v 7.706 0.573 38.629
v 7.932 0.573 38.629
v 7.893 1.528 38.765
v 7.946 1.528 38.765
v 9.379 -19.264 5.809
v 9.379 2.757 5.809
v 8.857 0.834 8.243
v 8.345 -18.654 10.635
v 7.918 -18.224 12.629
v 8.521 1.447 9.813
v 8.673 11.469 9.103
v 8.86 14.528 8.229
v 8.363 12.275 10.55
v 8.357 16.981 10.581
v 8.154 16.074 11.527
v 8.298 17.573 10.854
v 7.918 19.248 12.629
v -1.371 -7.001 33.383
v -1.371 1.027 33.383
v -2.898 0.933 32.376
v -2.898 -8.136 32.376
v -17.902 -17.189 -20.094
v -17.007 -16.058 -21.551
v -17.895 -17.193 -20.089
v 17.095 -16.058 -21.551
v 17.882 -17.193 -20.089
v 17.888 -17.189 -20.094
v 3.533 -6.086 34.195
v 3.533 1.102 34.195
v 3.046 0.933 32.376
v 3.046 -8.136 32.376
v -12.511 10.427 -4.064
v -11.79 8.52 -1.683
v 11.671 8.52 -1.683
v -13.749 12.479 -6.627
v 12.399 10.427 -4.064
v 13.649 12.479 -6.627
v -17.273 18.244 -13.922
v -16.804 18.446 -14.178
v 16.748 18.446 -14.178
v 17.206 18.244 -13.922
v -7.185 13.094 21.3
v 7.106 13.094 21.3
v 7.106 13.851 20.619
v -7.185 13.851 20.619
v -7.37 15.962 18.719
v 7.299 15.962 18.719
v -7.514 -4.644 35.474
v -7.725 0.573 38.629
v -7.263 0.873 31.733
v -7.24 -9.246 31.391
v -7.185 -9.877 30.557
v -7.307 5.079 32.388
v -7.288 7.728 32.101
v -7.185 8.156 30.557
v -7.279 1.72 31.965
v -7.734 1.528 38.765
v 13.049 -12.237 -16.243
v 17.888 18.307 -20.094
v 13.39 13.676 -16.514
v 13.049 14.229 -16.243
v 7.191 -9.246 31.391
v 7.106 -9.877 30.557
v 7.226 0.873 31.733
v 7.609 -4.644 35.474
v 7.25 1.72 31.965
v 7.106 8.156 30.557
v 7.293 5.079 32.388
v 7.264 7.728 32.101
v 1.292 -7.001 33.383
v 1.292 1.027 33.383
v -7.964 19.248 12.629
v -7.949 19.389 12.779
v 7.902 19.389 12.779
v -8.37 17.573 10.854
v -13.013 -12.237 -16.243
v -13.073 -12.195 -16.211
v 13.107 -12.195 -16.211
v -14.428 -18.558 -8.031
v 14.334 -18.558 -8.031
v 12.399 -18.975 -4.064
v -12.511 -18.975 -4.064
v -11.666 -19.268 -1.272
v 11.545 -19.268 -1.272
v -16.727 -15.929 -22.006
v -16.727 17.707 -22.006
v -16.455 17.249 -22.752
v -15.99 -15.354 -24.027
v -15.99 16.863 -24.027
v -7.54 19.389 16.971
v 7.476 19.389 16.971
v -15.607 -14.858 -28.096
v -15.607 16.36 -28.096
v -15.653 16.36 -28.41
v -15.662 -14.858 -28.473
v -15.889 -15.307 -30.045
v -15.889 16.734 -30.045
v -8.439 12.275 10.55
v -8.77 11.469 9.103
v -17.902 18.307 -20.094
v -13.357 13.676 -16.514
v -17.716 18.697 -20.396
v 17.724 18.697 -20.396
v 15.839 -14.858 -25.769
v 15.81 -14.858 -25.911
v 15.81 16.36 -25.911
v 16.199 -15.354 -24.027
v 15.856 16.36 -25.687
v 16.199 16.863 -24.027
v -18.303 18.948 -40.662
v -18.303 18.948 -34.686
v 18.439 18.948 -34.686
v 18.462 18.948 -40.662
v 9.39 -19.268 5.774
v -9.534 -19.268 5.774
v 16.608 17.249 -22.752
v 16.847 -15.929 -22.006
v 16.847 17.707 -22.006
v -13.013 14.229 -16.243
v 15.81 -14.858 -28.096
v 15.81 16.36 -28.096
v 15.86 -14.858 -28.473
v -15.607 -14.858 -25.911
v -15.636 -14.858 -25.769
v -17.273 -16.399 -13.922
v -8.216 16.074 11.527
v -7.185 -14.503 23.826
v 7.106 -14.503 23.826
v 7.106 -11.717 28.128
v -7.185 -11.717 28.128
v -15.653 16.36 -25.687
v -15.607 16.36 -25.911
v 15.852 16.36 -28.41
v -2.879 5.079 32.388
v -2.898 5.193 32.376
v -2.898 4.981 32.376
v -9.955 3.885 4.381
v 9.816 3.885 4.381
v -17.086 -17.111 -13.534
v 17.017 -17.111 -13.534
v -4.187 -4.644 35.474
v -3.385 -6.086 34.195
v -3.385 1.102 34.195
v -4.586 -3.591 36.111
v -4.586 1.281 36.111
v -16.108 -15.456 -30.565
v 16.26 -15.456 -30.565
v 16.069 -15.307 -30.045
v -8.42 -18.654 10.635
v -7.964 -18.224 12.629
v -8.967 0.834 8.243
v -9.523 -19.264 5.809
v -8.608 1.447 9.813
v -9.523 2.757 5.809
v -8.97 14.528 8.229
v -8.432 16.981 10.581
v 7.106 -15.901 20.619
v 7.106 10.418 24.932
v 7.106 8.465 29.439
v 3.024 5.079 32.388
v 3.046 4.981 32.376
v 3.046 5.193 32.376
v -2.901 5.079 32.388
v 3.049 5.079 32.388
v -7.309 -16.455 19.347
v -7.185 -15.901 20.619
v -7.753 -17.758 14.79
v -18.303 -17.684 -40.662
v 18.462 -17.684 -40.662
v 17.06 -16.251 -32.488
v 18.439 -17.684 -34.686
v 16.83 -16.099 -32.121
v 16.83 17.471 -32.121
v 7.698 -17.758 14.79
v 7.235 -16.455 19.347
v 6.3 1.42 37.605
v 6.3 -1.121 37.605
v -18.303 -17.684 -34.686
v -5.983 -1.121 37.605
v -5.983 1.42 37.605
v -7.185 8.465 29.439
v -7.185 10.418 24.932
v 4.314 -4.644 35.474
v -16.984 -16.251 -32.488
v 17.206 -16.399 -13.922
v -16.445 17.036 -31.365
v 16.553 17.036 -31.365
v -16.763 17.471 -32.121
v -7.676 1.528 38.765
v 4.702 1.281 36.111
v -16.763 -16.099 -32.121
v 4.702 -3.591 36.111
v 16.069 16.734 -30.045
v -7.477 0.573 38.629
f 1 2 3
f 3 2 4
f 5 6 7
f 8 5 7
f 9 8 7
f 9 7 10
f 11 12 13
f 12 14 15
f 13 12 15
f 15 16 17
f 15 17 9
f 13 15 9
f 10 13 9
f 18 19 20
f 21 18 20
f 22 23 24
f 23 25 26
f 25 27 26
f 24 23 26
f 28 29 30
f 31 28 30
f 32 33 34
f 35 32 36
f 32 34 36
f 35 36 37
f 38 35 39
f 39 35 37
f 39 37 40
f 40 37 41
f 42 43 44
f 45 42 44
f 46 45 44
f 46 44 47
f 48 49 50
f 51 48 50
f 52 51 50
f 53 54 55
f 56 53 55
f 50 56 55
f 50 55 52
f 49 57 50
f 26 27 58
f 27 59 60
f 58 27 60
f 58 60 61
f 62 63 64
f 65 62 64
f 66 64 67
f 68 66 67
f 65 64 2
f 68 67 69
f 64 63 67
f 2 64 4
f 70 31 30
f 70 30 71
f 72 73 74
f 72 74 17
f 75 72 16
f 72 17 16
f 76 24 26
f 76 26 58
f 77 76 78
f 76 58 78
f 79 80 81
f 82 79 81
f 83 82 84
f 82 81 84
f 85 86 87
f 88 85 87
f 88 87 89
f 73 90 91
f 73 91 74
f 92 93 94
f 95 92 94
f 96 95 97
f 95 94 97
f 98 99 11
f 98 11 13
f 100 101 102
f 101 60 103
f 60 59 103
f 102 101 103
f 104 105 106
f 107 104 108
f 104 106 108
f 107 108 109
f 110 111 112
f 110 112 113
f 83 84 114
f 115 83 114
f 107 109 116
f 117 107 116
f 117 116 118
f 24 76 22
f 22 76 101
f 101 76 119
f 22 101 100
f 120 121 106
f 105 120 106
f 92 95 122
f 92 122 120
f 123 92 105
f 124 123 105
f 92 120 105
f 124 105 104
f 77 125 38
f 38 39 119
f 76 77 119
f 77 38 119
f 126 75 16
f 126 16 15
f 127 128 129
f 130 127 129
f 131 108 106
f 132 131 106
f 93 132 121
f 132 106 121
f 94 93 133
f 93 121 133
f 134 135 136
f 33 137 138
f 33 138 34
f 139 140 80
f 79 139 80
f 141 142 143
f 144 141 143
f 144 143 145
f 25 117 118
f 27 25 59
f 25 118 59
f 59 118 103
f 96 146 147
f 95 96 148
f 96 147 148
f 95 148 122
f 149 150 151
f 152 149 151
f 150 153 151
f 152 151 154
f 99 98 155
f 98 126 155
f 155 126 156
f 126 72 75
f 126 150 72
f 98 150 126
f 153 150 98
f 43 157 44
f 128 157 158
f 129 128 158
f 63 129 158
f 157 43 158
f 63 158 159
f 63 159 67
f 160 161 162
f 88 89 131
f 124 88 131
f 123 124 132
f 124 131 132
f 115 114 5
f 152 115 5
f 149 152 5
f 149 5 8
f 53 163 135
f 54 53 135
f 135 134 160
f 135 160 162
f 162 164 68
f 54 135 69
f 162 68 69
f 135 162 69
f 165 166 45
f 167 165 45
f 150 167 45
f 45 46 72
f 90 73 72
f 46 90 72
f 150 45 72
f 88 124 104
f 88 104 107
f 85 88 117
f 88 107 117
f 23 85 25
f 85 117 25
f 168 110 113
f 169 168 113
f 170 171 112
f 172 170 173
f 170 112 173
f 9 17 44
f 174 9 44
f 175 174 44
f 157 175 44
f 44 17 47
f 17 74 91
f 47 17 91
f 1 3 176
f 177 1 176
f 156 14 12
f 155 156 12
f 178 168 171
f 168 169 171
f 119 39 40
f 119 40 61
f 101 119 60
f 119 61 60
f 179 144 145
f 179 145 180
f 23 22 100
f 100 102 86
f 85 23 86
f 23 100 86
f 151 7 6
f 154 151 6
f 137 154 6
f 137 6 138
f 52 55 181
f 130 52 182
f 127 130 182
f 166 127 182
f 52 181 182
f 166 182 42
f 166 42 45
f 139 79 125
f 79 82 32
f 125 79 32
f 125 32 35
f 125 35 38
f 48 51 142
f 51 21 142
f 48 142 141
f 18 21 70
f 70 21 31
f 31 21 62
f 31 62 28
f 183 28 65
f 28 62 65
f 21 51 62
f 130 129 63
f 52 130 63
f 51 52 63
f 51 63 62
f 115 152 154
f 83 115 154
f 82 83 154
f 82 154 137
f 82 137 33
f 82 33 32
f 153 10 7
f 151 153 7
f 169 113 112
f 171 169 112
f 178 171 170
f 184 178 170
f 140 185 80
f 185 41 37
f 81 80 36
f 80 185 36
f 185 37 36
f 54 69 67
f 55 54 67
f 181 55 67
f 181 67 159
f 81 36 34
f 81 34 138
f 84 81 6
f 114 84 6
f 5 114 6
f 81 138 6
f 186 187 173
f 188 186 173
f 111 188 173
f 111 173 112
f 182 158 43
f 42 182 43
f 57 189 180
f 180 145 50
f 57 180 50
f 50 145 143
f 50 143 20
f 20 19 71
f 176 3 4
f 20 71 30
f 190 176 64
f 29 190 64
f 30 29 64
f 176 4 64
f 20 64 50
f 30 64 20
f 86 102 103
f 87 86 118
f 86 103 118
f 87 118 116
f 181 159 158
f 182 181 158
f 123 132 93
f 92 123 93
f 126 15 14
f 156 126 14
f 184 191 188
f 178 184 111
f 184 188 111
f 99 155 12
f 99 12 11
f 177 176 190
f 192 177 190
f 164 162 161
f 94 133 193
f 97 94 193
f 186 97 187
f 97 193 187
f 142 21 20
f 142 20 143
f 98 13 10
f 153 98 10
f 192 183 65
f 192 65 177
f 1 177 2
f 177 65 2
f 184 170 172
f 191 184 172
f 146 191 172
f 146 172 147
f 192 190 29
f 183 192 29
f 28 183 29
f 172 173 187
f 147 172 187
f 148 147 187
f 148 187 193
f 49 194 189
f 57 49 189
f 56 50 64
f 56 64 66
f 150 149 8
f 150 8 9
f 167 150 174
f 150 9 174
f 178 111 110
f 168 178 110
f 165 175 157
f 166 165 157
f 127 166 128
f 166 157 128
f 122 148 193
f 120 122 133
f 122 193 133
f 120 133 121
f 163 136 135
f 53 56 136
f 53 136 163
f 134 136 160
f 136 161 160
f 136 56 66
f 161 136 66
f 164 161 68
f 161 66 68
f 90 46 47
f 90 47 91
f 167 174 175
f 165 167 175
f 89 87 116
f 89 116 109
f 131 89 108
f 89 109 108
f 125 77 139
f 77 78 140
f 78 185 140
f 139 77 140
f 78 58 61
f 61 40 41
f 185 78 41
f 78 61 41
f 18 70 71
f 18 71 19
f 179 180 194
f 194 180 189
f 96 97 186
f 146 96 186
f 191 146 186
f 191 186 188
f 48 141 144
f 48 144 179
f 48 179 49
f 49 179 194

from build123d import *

# Parameters (mm, degrees)
F2_W     = 43.18
F2_H     = 86.36
F3_DEPTH = 21.59
F4_W     = 43.18
F4_H     = 86.36
F5_DEPTH = 43.18
F7_DEPTH = 21.59


with BuildPart() as f3:
    # F2 (on Right) → F3 (new body, symmetric)
    with BuildSketch(Plane.YZ):
        Rectangle(F2_W, F2_H)
    extrude(amount=F3_DEPTH, both=True)

    # F4 (on face) → F5 (cut)
    with BuildSketch(Plane(origin=(0, 21.59, 0), x_dir=(-1, 0, 0), z_dir=(0, 1, 0))):
        Rectangle(F4_W, F4_H)
        Polygon((18.302919, -40.662199), (-18.461943, -40.662199), (-18.438558, -34.686282), (-16.829565, -32.120593), (-16.069479, -30.044995), (-15.809655, -28.096024), (-15.809655, -25.911188), (-16.199389, -24.026766), (-16.846587, -22.005791), (-17.888235, -20.094059), (-13.049044, -16.243285), (-17.206199, -13.921896), (-12.399486, -4.064204), (-9.379052, 5.809045), (-7.917551, 12.629382), (-7.105607, 20.618919), (-7.105607, 30.557126), (-7.950029, 38.806483), (-6.30046, 37.604805), (-4.702249, 36.110826), (-3.533049, 34.194637), (-3.045882, 32.37588), (-1.292081, 33.382691), (1.371098, 33.382691), (2.897554, 32.37588), (3.384721, 34.194637), (4.5864, 36.110826), (5.982945, 37.604805), (7.736745, 38.806483), (7.184624, 30.557126), (7.184624, 20.618919), (7.964091, 12.629382), (9.523025, 5.809045), (12.510981, -4.064204), (17.273372, -13.921896), (13.01294, -16.243285), (17.901512, -20.094059), (16.727163, -22.005791), (15.989779, -24.026766), (15.607432, -25.911188), (15.607432, -28.096024), (15.889227, -30.044995), (16.763162, -32.120593), (18.302919, -34.686282), align=None, mode=Mode.SUBTRACT)
    extrude(amount=-F5_DEPTH, mode=Mode.SUBTRACT)

    # F6 (on Right) → F7 (cut, symmetric)
    with BuildSketch(Plane.YZ):
        Polygon((18.948087, -40.815897), (22.037912, -40.815897), (22.175604, 40.474616), (-21.876609, 40.474616), (-21.876609, -40.680926), (-17.684452, -40.680926), (-17.684452, -34.686282), (-16.250653, -32.487791), (-15.455558, -30.56524), (-14.857819, -28.473156), (-14.857819, -25.76942), (-16.058451, -21.550797), (-17.192863, -20.088844), (-12.195049, -16.210757), (-17.110933, -13.534333), (-18.558385, -8.031274), (-19.268457, -1.271935), (-19.268457, 5.774164), (-18.653972, 10.635425), (-17.757623, 14.789965), (-16.455481, 19.347463), (-14.502783, 23.826377), (-11.717116, 28.127776), (-9.24552, 31.391378), (-4.643708, 35.474289), (0.57259, 38.628653), (1.528456, 38.765203), (0.873005, 31.732757), (1.719629, 31.964898), (5.078816, 32.38821), (7.72793, 32.101449), (8.465313, 29.43868), (10.418011, 24.932453), (13.094435, 21.300161), (15.962034, 18.719323), (19.389497, 16.971454), (19.389497, 12.779298), (17.573351, 10.853911), (16.073769, 11.526532), (16.980739, 10.580613), (14.528235, 8.229095), (11.469464, 9.103029), (12.275122, 10.550483), (1.446525, 9.813101), (0.833981, 8.242985), (3.885183, 4.380703), (8.519922, -1.683081), (12.478762, -6.626802), (18.445989, -14.177564), (13.676071, -16.514244), (18.697038, -20.395836), (17.248681, -22.751831), (16.360357, -25.687164), (16.360357, -28.410073), (17.036257, -31.364718), (18.948087, -34.686282), align=None)
    extrude(amount=F7_DEPTH, both=True, mode=Mode.SUBTRACT)


solid = f3.part
